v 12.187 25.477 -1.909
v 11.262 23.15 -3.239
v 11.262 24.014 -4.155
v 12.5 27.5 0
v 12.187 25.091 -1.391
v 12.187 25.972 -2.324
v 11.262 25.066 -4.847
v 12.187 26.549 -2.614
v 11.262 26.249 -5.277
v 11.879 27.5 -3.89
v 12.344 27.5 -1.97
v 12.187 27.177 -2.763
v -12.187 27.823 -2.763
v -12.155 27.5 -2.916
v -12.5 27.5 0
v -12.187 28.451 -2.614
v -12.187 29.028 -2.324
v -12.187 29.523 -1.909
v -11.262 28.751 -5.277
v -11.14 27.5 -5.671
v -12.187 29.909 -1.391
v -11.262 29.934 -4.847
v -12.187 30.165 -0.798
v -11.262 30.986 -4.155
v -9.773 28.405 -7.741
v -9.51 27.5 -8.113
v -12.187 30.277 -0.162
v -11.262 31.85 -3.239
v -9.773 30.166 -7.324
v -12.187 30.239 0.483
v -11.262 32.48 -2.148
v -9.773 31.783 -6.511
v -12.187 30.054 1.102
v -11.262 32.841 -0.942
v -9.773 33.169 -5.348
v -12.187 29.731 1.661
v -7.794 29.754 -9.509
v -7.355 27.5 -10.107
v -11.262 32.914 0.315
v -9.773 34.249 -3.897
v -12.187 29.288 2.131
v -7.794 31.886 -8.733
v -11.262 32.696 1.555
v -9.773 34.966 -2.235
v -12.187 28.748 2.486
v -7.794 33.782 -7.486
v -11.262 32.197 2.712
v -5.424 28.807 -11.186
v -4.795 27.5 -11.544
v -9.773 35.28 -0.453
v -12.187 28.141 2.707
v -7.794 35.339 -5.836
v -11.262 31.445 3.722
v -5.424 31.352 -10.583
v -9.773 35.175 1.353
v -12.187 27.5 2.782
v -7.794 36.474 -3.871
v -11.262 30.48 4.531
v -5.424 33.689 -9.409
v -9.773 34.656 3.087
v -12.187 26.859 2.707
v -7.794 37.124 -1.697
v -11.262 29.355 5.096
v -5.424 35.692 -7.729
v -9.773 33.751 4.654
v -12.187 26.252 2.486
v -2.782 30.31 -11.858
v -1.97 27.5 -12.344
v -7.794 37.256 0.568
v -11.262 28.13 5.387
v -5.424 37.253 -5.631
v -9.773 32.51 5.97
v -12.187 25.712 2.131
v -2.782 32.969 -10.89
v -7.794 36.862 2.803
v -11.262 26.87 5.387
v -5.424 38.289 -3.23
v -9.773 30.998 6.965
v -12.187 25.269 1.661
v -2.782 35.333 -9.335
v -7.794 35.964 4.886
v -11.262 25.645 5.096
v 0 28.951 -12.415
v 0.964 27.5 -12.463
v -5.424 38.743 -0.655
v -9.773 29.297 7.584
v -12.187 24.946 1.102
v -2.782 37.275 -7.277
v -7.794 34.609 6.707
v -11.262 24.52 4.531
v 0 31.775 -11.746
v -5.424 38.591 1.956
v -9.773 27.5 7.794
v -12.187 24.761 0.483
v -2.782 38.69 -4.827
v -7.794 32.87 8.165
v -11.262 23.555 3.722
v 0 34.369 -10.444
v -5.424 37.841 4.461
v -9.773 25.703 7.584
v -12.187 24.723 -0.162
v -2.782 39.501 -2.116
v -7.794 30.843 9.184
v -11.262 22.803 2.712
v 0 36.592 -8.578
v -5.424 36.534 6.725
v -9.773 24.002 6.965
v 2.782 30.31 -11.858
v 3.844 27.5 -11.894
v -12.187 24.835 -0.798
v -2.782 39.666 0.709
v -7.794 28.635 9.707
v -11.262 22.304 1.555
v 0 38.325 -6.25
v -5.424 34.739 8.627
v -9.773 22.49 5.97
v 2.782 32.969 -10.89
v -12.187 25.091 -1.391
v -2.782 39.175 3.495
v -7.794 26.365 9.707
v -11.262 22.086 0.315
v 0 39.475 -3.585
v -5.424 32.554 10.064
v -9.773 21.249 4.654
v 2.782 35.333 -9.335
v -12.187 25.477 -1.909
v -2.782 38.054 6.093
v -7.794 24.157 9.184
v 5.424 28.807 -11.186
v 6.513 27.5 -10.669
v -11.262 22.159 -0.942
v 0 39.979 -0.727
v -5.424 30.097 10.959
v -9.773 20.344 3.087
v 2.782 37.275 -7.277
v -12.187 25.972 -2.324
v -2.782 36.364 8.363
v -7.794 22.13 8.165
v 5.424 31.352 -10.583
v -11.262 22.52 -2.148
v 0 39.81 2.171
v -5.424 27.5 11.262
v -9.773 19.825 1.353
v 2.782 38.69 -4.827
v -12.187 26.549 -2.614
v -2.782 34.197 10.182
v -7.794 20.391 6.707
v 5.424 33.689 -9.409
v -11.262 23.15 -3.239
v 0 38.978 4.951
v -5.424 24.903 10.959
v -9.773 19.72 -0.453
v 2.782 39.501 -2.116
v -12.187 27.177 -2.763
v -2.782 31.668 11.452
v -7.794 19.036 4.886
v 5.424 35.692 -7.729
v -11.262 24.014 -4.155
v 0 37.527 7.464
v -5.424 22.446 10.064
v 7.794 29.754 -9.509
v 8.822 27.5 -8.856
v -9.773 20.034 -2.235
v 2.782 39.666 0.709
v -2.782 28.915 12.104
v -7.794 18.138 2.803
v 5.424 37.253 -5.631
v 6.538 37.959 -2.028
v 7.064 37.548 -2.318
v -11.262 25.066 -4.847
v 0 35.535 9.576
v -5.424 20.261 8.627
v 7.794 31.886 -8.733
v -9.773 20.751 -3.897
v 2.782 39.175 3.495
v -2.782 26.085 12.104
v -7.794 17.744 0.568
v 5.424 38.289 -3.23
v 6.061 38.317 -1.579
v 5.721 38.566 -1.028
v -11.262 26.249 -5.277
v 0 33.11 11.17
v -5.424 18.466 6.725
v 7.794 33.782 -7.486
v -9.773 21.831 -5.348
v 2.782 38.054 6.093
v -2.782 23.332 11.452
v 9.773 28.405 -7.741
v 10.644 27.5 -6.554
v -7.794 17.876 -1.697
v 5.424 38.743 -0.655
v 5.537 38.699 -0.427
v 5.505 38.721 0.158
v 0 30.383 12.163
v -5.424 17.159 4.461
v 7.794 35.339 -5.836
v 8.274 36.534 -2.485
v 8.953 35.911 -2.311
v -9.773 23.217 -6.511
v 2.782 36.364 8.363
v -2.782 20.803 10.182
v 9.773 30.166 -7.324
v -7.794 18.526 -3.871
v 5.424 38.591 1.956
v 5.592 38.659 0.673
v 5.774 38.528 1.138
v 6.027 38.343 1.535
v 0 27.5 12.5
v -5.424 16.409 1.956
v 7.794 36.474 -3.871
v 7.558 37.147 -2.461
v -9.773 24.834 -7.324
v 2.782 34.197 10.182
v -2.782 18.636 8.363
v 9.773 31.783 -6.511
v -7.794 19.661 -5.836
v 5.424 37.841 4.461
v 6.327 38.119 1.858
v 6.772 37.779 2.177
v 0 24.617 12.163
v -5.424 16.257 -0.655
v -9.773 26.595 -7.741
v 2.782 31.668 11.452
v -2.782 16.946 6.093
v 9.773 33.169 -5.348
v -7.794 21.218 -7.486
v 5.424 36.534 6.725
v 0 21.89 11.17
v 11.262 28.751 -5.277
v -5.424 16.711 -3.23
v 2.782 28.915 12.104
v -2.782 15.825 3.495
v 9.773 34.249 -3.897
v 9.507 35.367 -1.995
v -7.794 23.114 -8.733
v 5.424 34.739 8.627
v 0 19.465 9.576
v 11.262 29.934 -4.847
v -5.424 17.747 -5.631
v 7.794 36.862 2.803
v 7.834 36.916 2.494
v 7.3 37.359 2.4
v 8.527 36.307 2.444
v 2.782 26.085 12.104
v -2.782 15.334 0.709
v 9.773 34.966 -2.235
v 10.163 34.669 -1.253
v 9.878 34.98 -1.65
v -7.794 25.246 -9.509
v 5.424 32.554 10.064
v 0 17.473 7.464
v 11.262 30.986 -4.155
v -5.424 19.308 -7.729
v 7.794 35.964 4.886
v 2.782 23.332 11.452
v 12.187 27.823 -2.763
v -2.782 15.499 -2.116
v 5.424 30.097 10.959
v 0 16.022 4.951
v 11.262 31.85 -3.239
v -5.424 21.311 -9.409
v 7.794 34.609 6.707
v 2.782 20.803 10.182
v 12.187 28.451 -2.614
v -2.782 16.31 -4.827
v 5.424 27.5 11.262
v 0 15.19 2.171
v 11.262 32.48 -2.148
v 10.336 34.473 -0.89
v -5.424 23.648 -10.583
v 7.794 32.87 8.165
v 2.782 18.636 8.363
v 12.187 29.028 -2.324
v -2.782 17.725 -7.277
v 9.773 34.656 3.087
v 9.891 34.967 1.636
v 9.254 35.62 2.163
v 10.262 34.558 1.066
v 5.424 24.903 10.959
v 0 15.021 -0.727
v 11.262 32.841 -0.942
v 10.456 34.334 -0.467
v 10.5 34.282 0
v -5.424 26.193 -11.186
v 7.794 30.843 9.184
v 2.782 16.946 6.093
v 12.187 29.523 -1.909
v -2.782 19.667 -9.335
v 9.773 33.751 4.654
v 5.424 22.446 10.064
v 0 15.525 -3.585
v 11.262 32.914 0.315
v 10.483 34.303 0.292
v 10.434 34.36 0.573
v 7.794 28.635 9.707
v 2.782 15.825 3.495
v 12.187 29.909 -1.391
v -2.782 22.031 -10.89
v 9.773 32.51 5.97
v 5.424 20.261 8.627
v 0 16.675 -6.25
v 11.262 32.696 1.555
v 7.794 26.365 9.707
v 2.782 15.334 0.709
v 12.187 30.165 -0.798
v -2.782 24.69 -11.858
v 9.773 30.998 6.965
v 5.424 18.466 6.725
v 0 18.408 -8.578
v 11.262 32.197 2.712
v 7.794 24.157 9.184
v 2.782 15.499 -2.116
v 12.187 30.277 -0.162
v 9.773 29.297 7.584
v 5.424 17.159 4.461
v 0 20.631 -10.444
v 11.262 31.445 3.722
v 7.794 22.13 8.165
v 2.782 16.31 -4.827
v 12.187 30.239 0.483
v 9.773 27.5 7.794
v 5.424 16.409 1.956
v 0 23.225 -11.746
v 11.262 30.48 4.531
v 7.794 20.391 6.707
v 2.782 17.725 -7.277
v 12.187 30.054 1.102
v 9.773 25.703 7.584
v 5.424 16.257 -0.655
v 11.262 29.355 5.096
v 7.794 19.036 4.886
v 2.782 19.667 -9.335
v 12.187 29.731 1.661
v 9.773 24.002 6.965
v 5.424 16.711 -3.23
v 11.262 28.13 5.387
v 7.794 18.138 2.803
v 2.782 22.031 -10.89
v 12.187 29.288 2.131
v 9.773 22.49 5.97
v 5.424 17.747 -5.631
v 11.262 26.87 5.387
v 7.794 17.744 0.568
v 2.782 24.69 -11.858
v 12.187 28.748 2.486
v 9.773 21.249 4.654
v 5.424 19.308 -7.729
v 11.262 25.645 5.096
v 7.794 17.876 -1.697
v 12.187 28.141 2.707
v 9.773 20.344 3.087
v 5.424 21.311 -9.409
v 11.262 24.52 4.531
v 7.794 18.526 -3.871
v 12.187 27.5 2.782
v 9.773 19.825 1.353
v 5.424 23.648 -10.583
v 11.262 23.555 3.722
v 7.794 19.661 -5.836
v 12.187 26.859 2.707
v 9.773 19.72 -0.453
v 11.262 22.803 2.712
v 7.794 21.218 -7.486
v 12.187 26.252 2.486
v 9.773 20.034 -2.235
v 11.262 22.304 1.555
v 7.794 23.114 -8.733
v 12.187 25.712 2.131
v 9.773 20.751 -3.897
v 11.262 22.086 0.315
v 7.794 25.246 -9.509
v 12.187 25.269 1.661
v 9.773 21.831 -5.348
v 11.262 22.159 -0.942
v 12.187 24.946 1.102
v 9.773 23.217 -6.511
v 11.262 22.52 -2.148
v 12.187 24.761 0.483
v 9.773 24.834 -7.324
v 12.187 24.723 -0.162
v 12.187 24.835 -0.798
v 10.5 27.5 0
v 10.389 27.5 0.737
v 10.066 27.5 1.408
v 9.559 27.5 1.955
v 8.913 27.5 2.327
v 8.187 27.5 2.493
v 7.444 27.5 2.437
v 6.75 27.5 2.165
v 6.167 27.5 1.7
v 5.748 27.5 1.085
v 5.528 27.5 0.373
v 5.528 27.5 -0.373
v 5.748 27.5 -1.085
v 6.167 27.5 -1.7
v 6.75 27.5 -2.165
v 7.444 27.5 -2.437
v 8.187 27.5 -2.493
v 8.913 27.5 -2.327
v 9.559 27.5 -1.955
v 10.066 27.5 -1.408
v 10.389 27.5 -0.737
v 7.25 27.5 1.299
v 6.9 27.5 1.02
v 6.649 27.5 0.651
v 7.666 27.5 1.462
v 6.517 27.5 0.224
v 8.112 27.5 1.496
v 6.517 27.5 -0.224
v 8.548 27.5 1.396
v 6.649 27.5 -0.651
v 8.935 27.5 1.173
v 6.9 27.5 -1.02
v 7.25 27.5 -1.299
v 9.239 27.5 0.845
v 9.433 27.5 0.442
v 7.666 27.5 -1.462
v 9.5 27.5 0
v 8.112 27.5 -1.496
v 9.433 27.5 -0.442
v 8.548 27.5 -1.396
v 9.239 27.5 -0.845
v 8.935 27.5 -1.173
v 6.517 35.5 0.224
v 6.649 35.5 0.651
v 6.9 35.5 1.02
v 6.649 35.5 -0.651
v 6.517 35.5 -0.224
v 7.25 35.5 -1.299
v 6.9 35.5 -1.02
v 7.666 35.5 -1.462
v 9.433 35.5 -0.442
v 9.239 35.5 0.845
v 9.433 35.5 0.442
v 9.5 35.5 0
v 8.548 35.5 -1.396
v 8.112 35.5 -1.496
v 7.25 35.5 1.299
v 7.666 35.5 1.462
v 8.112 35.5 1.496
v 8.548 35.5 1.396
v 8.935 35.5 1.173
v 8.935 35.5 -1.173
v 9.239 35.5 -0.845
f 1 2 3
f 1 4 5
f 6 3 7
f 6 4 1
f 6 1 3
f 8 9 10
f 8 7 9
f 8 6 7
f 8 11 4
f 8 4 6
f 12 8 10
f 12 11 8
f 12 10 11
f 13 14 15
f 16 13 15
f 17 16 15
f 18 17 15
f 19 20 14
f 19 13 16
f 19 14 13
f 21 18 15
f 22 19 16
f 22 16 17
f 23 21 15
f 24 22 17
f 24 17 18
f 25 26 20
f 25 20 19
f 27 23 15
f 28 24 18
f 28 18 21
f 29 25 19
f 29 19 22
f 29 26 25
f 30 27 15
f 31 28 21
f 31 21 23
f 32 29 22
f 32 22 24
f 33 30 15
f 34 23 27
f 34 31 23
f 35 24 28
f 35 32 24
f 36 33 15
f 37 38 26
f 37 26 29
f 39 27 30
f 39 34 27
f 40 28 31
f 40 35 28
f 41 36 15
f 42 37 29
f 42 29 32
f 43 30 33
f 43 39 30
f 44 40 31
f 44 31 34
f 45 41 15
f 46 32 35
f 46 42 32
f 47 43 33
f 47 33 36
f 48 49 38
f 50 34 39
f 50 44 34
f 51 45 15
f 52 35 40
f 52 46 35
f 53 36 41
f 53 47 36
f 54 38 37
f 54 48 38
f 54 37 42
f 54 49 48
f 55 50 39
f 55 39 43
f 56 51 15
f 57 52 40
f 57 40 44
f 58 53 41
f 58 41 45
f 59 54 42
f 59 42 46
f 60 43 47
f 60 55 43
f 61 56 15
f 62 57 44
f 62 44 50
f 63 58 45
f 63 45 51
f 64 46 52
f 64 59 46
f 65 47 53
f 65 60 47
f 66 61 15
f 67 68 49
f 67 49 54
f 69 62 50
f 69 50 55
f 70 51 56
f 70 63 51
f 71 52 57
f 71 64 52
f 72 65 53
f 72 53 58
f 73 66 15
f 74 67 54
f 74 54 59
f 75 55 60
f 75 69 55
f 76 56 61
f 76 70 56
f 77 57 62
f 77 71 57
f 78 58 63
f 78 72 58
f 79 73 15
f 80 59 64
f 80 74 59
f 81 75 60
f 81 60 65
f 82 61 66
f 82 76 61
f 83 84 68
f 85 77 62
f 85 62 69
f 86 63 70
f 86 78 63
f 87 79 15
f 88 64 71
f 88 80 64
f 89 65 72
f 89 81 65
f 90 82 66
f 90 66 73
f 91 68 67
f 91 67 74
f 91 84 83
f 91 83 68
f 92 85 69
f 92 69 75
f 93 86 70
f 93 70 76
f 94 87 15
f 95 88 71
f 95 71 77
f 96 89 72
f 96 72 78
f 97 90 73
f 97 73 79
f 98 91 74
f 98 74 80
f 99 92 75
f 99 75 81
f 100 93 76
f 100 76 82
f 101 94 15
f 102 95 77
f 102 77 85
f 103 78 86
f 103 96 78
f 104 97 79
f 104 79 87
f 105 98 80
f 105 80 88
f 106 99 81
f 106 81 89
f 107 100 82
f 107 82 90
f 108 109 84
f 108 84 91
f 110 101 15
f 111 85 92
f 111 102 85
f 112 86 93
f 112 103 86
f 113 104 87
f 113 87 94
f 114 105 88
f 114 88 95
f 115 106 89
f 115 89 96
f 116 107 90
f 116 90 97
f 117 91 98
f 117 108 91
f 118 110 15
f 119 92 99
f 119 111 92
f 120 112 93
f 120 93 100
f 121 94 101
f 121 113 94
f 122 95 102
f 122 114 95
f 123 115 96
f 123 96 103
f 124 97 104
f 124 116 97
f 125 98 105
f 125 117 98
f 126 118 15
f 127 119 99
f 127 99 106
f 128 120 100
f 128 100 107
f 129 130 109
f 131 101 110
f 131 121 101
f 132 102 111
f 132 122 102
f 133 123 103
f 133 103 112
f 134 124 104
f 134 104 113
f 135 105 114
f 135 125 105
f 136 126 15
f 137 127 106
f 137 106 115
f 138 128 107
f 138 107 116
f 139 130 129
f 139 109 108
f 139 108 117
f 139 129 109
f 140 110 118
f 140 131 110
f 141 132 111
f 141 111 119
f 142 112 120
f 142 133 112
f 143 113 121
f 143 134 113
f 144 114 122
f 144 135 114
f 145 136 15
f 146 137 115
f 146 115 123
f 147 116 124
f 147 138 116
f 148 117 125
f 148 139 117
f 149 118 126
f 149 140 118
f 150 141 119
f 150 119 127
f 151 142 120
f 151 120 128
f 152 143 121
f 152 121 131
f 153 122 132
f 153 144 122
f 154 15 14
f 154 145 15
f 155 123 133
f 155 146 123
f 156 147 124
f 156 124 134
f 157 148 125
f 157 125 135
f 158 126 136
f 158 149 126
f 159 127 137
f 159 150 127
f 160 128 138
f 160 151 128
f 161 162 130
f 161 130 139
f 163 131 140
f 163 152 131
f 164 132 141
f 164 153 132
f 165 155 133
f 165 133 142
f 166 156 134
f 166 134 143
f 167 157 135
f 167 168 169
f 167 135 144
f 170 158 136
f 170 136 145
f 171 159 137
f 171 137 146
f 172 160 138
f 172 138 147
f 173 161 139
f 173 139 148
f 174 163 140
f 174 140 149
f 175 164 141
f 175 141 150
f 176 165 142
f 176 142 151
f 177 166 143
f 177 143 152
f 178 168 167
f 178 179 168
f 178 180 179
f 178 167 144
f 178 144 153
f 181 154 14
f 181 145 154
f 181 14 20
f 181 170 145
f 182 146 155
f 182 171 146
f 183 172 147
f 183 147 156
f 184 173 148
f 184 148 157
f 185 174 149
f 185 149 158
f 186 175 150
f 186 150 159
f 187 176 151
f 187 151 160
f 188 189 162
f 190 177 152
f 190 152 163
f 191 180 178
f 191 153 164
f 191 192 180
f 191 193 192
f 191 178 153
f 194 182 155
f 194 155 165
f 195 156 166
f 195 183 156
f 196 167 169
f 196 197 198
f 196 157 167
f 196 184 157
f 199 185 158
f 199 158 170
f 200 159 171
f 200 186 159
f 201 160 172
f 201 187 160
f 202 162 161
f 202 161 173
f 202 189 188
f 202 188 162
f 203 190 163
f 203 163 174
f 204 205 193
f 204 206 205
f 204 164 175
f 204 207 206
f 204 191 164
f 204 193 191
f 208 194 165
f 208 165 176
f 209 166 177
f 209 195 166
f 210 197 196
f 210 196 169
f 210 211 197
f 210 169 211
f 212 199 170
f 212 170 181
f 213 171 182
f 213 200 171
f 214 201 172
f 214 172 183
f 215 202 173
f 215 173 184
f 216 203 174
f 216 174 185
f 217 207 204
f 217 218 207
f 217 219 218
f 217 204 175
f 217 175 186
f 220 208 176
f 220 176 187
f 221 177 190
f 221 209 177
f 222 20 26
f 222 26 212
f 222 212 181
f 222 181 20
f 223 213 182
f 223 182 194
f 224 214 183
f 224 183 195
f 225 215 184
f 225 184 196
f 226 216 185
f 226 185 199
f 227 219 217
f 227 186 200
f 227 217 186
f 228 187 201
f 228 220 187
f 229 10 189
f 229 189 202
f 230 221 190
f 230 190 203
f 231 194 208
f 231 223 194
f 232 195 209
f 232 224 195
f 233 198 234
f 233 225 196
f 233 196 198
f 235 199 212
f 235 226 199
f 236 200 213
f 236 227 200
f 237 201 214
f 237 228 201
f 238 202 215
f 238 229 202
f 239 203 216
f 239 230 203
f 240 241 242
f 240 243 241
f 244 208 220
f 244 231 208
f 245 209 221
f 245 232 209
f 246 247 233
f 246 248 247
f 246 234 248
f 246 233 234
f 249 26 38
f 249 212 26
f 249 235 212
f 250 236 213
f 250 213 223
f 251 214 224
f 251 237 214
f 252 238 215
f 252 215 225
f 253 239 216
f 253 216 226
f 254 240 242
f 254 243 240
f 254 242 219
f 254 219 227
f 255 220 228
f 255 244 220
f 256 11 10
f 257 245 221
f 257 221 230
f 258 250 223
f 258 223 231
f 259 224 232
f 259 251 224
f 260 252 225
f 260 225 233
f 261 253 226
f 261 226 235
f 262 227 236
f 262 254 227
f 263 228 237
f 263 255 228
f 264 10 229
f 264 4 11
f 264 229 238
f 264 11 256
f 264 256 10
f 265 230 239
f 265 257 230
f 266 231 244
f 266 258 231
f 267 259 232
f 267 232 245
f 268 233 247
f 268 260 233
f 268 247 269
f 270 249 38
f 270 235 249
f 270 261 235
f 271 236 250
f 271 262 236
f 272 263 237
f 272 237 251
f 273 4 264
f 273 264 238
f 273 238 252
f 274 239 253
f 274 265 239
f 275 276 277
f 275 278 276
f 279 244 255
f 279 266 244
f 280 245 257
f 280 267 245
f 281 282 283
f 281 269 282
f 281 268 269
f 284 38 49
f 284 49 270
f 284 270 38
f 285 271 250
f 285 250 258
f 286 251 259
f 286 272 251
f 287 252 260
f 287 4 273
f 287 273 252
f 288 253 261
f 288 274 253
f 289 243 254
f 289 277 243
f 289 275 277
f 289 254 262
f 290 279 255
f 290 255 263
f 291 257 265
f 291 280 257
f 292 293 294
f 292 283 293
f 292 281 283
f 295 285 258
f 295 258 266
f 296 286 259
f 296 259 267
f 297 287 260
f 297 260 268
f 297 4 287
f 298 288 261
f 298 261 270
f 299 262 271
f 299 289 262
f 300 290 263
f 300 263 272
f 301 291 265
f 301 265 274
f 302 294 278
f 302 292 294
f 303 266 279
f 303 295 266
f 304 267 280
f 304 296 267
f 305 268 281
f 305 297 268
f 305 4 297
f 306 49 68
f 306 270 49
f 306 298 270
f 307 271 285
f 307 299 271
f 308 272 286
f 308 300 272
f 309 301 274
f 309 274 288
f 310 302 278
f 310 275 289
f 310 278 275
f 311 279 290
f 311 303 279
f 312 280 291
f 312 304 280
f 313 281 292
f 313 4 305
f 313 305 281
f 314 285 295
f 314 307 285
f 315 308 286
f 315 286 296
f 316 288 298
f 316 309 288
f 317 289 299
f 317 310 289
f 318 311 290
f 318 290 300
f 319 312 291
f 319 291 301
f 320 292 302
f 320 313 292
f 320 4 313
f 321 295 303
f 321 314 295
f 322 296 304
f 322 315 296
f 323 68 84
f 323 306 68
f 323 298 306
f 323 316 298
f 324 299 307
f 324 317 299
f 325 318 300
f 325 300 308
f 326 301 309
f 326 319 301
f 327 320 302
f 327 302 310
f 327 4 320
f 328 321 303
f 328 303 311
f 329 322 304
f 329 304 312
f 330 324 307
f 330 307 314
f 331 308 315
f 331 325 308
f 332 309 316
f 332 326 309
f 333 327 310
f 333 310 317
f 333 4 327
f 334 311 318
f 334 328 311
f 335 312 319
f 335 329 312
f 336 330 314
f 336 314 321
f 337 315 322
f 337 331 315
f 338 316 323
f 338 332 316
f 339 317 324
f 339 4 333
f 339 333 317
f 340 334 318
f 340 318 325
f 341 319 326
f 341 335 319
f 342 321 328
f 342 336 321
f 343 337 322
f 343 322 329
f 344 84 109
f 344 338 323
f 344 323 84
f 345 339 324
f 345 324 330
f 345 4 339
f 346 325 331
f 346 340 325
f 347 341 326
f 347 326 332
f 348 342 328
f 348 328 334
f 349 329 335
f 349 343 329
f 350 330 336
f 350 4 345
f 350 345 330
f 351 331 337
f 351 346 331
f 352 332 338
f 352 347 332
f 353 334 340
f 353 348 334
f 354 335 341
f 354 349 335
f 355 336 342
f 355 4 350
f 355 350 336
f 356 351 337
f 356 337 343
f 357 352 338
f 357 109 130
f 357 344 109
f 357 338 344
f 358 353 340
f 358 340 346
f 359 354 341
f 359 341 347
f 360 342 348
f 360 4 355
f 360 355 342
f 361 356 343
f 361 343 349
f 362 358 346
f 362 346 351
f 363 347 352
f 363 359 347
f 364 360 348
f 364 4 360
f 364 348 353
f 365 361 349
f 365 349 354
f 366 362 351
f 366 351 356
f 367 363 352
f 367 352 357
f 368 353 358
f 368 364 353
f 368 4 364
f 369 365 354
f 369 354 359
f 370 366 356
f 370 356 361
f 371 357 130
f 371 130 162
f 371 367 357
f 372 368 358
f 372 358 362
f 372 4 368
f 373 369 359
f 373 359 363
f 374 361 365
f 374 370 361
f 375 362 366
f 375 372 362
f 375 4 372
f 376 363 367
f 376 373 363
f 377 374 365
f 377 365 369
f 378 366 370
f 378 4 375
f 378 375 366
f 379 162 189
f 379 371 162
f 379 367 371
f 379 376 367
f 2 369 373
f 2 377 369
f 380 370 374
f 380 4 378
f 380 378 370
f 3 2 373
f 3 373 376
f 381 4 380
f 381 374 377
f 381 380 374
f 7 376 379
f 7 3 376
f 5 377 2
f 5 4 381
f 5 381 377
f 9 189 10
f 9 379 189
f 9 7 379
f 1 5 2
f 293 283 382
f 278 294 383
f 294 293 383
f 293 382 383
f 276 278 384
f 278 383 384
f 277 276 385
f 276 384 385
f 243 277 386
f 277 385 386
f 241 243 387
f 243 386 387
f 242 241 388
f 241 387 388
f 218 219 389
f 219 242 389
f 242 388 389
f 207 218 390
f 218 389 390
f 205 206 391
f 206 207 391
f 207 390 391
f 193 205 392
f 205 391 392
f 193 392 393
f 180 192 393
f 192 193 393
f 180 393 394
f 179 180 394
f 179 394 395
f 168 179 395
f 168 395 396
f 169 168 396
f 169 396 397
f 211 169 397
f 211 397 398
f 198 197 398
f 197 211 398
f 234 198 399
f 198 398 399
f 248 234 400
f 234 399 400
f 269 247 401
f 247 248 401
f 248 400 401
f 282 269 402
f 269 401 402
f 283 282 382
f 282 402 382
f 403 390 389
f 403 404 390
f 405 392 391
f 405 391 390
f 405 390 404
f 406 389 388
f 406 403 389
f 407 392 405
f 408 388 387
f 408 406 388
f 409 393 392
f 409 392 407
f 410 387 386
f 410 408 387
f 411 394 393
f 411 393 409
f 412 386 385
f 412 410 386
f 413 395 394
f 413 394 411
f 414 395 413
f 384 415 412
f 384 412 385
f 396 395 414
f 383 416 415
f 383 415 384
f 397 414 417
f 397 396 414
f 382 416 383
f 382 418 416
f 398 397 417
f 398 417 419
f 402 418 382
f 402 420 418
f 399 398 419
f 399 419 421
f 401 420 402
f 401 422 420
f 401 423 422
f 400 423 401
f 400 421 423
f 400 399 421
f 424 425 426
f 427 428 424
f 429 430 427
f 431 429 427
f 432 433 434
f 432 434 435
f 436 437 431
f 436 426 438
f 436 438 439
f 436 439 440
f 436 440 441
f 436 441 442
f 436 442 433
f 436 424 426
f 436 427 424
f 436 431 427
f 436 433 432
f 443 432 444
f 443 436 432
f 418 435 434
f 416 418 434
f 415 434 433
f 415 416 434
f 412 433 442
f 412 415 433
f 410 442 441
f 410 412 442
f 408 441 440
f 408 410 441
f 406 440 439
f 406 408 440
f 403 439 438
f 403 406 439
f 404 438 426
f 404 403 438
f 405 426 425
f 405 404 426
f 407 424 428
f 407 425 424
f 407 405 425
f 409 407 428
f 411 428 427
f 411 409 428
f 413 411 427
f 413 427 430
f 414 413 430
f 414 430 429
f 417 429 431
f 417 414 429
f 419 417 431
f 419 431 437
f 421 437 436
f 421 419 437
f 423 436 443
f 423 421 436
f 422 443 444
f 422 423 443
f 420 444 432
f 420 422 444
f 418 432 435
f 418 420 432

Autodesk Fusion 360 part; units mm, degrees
sphere "球体基本要素2" add diameter 25 placed x (0, 0, -1) y (0, 1, 0) z (1, 0, 0) at (0, 27.5, 0)
ref_plane "工作平面1" through (0, 27.5, 0) normal (0, 1, 0) x (0, 0, 1)
sketch "草图6" plane through (0, 27.5, 0) normal (0, 1, 0) x (1, 0, 0)
  circle A0 centre (8, 0) radius 1.5
  circle A1 centre (8, 0) radius 2.5
  dimension "d25" = 3
  dimension "d26" = 5
  dimension "d27" = 8
extrude "拉伸6" cut sketch "草图6" along normal through all
extrude "拉伸7" cut sketch "草图6" along normal blind 16 contours A0
extrude "拉伸8" add sketch "草图6" along normal blind 8 contours A0
thread "螺纹3" "ISO Metric profile 3.0 M3x0.5 6g" major diameter 2.927 minor diameter 2.3555 pitch 0.5 angle 60 resizes the face on face at (9.4925, 30.1667, 0.1494)
sketch "草图7" plane through (0, 0, 0) normal (0, 0, 1) x (1, 0, 0)
  line L0 (-0.0753, 40.4285) -> (-0.0753, 14.5)
  line L1 (-0.0753, 14.5) -> (-0.0753, 40.5)
  line L2 (-0.0753, 40.5) -> (-0.0753, 14.5)
  dimension "d33" = 26
